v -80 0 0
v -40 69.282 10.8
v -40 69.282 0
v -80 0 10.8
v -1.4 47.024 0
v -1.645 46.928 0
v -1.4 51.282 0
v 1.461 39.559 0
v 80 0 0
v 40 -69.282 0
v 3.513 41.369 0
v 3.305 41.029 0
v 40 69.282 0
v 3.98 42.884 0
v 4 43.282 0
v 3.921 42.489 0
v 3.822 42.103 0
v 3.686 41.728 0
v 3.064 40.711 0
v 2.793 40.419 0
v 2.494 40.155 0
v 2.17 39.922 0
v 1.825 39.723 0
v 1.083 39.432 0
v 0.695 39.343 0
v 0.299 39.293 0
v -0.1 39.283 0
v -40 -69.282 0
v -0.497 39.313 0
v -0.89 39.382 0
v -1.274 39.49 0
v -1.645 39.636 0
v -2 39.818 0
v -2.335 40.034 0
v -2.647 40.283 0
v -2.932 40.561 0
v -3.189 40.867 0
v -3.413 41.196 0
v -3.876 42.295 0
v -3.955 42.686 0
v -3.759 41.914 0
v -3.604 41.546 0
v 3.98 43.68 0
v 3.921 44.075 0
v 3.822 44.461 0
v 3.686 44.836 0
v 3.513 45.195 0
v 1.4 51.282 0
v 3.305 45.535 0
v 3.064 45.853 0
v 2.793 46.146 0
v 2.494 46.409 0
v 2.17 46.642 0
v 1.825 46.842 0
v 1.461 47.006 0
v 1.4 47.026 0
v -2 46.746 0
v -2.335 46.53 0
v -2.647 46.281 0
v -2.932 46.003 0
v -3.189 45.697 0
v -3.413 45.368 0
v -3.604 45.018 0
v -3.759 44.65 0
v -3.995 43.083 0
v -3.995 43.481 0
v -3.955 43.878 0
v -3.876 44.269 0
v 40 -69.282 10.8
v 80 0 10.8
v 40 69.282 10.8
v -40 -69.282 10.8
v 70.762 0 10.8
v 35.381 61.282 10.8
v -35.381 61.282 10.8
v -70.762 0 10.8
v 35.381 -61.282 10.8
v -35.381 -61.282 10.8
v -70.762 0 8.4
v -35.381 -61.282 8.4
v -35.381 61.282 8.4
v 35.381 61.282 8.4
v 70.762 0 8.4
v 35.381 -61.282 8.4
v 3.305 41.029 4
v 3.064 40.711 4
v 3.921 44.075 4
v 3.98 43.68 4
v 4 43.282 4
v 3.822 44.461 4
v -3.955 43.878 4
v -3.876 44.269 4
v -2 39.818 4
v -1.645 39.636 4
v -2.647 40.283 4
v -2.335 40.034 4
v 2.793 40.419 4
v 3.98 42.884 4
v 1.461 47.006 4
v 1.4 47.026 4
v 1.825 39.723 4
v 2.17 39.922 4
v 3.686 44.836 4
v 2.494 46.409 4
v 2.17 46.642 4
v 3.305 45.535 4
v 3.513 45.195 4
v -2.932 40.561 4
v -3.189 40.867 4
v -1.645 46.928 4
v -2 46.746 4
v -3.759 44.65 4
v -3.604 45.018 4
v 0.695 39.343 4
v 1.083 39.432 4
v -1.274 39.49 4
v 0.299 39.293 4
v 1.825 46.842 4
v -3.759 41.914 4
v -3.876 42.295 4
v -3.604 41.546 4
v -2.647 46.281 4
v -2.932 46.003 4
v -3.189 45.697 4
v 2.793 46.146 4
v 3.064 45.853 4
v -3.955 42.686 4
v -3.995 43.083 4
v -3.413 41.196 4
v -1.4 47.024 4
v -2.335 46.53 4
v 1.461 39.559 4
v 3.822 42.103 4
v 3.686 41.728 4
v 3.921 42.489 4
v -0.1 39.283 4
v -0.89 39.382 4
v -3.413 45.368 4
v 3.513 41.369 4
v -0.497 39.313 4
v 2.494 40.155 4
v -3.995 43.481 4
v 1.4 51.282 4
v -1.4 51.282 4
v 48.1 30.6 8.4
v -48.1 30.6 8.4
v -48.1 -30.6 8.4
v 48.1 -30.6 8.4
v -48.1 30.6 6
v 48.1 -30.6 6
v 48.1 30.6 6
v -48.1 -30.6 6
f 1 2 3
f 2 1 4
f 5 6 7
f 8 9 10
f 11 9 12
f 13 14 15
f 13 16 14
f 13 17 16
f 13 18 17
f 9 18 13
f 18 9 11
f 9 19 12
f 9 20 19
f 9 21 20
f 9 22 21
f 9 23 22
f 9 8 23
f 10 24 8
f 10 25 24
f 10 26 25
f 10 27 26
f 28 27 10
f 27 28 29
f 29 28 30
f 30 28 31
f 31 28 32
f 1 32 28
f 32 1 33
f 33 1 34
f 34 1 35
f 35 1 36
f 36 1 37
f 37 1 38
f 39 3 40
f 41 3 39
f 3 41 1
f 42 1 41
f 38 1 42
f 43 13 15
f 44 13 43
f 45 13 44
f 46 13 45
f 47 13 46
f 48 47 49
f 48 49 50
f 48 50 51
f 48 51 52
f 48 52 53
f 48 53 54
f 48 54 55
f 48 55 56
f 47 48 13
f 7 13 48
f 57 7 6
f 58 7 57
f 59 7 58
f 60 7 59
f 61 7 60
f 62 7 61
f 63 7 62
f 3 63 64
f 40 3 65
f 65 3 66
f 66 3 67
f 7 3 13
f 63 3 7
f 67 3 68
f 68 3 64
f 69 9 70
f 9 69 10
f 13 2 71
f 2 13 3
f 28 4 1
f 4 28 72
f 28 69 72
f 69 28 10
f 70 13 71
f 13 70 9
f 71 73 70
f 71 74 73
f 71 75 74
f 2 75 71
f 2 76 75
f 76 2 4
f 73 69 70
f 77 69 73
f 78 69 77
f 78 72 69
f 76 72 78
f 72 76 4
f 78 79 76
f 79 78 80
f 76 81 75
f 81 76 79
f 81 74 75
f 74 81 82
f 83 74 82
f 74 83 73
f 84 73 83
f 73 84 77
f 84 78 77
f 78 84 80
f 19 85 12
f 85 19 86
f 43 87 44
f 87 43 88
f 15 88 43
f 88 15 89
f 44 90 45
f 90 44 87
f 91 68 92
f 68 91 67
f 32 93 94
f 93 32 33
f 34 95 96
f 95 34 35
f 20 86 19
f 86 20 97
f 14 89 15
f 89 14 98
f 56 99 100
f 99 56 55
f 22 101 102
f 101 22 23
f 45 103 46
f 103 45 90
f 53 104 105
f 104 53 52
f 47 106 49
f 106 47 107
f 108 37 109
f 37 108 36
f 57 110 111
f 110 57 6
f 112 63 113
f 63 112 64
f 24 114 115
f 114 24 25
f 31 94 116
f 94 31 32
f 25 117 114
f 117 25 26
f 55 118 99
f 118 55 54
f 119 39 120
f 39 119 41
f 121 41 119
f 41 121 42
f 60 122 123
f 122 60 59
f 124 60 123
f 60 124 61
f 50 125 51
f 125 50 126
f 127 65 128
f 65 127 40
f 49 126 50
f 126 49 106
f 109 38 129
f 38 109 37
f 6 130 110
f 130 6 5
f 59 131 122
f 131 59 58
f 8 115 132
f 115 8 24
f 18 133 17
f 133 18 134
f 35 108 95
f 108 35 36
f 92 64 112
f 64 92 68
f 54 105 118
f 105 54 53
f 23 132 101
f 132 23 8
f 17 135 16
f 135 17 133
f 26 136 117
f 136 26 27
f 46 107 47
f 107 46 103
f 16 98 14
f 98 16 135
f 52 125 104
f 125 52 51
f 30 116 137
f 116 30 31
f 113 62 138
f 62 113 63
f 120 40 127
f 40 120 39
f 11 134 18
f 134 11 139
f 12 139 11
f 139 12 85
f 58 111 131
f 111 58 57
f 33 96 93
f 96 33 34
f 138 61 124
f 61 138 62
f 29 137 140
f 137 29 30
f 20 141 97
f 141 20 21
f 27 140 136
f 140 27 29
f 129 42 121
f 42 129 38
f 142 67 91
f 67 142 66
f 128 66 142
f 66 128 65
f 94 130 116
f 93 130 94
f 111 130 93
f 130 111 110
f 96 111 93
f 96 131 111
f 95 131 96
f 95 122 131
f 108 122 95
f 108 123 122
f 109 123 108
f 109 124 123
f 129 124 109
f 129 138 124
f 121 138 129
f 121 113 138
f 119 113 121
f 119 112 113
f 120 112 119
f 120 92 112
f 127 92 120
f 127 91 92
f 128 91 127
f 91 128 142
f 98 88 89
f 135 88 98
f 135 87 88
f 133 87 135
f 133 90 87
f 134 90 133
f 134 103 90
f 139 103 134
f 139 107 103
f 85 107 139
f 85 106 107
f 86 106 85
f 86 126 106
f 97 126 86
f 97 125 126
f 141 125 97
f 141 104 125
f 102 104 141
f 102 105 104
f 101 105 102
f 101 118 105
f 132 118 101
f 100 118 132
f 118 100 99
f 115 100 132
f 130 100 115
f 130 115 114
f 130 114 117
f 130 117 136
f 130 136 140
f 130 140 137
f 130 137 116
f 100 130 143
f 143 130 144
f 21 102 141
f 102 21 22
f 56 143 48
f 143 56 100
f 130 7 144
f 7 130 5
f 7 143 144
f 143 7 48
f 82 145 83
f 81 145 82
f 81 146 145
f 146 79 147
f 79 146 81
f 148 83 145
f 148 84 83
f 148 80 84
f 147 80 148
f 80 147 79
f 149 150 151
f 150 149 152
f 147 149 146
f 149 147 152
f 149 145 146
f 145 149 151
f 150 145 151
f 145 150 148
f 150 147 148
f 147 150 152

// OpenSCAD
// =============================================================================
// Finisher Patch Frame
// =============================================================================


// ========================== USER SETTINGS ==============================
/* [Output] */
//  Export the full frame, shell only, or loose front inlay to reduce filament changes
part = "frame"; // [frame,frame_shell,front_inlay]

/* [Patch Text] */
// Top text embossed above the patch opening (e.g. race date)
top_text = "";
// Bottom text embossed below the patch opening (e.g. finish time)
bottom_text = "";      

/* [Text Style] */
// Verify the exact font name in OpenSCAD Help -> Font List on the target system.
// Font used for both text lines
text_font  = "Oswald:style=Bold"; // ["Oswald:style=Bold","Barlow Semi Condensed:style=Bold","Barlow Condensed:style=Bold"]
// mm, letter height for the date line
date_size  = 8;                   
// mm, letter height for the finish-time line
time_size  = 11;
// mm, emboss height above the front inlay surface
text_raise = 1.0;

/* [Mounting Options] */
// Add a hidden keyhole hanger on the back for wall mounting
hanger_enabled     = true;
// Add hidden dovetail slots so frames can link side-to-side
connectors_enabled = false;

// ============================= HEXAGON — FLAT-TOP REGULAR ===================
// All dimensions derive from hex_side so the tile stays exactly regular.
/* [Overall Size] */
// mm, length of one outer hexagon side
hex_side     = 80;

// ================== PATCH (Size of HYROX 25/26 patches) =====================
/* [Patch Shape] */
// Opening shape in the recessed front inlay
patch_shape = "rectangle"; // [rectangle,circle]

/* [Patch Pocket] */
// The default patch is a tall rectangle (bounding box ~60 x 95 mm). We mount
// it in landscape orientation, so "patch width" is the long horizontal edge.
// mm, patch width in the frame's landscape orientation
patch_w     = 95;
// mm, patch height in the frame's landscape orientation
patch_h     = 60;
// mm, physical diameter of a round patch when patch_shape is "circle"
patch_diameter = 90;
// mm, extra fit clearance around the patch on each side
patch_tol   = 0.6;
// mm, pocket depth for the patch body
patch_depth = 2.4;

/* [Appearance] */
// Color for the shell, rim, and outer body
frame_body_color = "white";
 // Color for the recessed front inlay around the patch
frame_face_color = "black";

/* [Hidden] */
hex_width    = hex_side * 2;       // point-to-point
hex_height   = hex_side * sqrt(3); // flat-to-flat
hex_shoulder = hex_side / 2;       // point inset from the flats


// ========================== LAYER STACK ================================
// z = 0 is the wall side. Total frame thickness = body_thick + well_depth.
body_thick            = 5.0;                     // mm, solid back/body thickness
face_thick            = patch_depth + 1.0;       // Thickness of the separate front inlay layer
rim_lift              = 2.4;                     // mm, how far the outer frame stands above the face
well_depth            = face_thick + rim_lift;   // Total recess depth above the body
frame_total_thick     = body_thick + well_depth; // mm, overall frame thickness at the outer perimeter
rim_width             = 8;                       // mm, visible frame rim width from the outer edge inward
front_inlay_clearance = 0.15;                    // mm, glue-up clearance per side for the loose front inlay


// ============================= DOVETAIL CONNECTORS ===========================
conn_mouth_w         = 9;    // mm, narrow visible opening of each dovetail slot
conn_lock_w          = 13;   // mm, wider locking width deeper inside the frame
conn_depth           = 9;    // mm, inward reach of the dovetail slot
conn_tol             = 0.25; // mm, extra side clearance for connector fit
slot_mouth_overshoot = 0.3;  // mm, slight extension past the edge for a clean opening


// ============================= HANGER ========================================
hanger_d          = 8.0;  // mm, round clearance for the nail or screw head
hanger_shaft_d    = 2.8;  // mm, narrow slot width for the nail or screw shaft
hanger_drop       = 8;    // mm, downward travel from the round hole into the slot
hanger_y_off      = 26;   // mm, hole center offset down from the top flat
hanger_front_wall = 1.0;  // mm, material left between the hanger slot and the front face


// ============================= BOOLEAN TWEAKS ================================
bool_eps = 0.01; // mm, tiny overlap used to keep boolean cuts robust
conn_slot_h = body_thick - 0.8 + bool_eps; // mm, connector slot depth with a fixed front cover


// ============================= RENDER QUALITY ================================
$fa = 2;
$fs = 0.4;


// =============================================================================
// SANITY CHECKS
// =============================================================================

function is_valid_part(p) =
  p == "frame" ||
  p == "frame_shell" ||
  p == "front_inlay";

function is_valid_patch_shape(shape) =
  shape == "rectangle" ||
  shape == "circle";

function face_inner_side(clearance = 0) =
  hex_side - 2 * (rim_width + clearance) / sqrt(3);
function face_inner_height(clearance = 0) =
  hex_height - 2 * (rim_width + clearance);
function face_inner_half_width_at_y(y, clearance = 0) =
  let(side = face_inner_side(clearance))
  side - abs(y) / sqrt(3);

module _sanity() {
  pocket_w = pocket_width();
  pocket_h = pocket_height();
  pocket_d = pocket_diameter();
  pocket_half_y = pocket_h / 2;
  min_face_half_w = face_inner_half_width_at_y(pocket_half_y, front_inlay_clearance);
  min_face_h = face_inner_height(front_inlay_clearance);
  hanger_top_margin = hanger_y_off - hanger_d / 2;
  hanger_top_slot_y = hex_height / 2 - hanger_y_off + hanger_drop;

  assert(is_valid_part(part),
      str("Unknown part '", part,
          "'. Use frame, frame_shell, or front_inlay."));
  assert(is_valid_patch_shape(patch_shape),
      str("Unknown patch_shape '", patch_shape,
          "'. Use rectangle or circle."));
  assert(front_inlay_clearance >= 0,
      "front_inlay_clearance must be non-negative");
  assert(face_inner_side(front_inlay_clearance) > 0,
      "rim_width + front_inlay_clearance leaves no usable front inlay");
  if (patch_shape == "circle") {
    assert(patch_diameter > 0,
        "patch_diameter must stay positive");
    assert(pocket_d < min_face_h,
        "circular patch pocket exceeds the recessed face insert; reduce patch diameter/tolerance or increase the usable face area");
  } else {
    assert(pocket_h < min_face_h,
        "patch pocket height exceeds the recessed face insert height");
    assert(pocket_w / 2 < min_face_half_w,
        "patch pocket reaches the sloped face edges; reduce patch size/tolerance or increase the usable face area");
  }
  assert(conn_mouth_w + 2 * conn_tol < conn_lock_w,
      "dovetail mouth width too close to lock width — will not hold");
  assert(conn_depth > rim_width,
      "conn_depth must exceed rim_width so the slot reaches under the recessed face layer");
  assert(conn_mouth_w + 2 * conn_tol < hex_side,
      "dovetail mouth width exceeds the available edge length");
  assert(conn_lock_w + 2 * conn_tol < hex_side,
      "dovetail lock width too large for the hex side length");
  assert(hanger_front_wall >= 0 && hanger_front_wall < body_thick,
      "hanger_front_wall must stay non-negative and below body_thick");
  assert(hanger_top_margin > 0,
      "hanger hole breaches the top flat; increase hanger_y_off or reduce hanger_d");
  assert(hanger_top_slot_y < hex_height / 2,
      "hanger slot breaches the top flat; reduce hanger_drop or increase hanger_y_off");
  assert(face_thick > patch_depth,
      "face_thick must exceed patch_depth so the pocket stays inside the recessed face layer");
  assert(rim_lift > 0,
      "rim_lift must stay visibly positive so the outer frame stands proud of the face");
}
_sanity();


// =============================================================================
// 2D PRIMITIVES
// =============================================================================

// Corner order matches hex_shape(): CCW, flat-top, starting at the right point.
function hex_corners() = [
  [ hex_width / 2,  0             ],
  [ hex_shoulder,   hex_height / 2],
  [-hex_shoulder,   hex_height / 2],
  [-hex_width / 2,  0             ],
  [-hex_shoulder,  -hex_height / 2],
  [ hex_shoulder,  -hex_height / 2]
];

// Regular flat-top hexagon centred on the origin, with CCW winding.
module hex_shape() {
  polygon(hex_corners());
}

// Inset the hex by a perpendicular distance d.
module hex_inset(d) {
  offset(r = -d) hex_shape();
}

// Mouth sits on y = 0 and widens toward +y up to depth L.
module dovetail_profile(mouth, lock, depth) {
  polygon([
    [-mouth / 2, 0],
    [ mouth / 2, 0],
    [ lock / 2,  depth],
    [-lock / 2,  depth]
  ]);
}

// =============================================================================
// EDGE HELPERS
// =============================================================================

function edge_mid(p1, p2) = [
  (p1[0] + p2[0]) / 2,
  (p1[1] + p2[1]) / 2
];

// For a CCW polygon, the outward normal of edge p1→p2 is (dy, -dx).
function edge_outward_angle(p1, p2) =
  let(dx = p2[0] - p1[0], dy = p2[1] - p1[1])
  atan2(-dx, dy);

module on_edge(edge_i, offset = [0, 0, 0]) {
  corners = hex_corners();
  p1 = corners[edge_i];
  p2 = corners[(edge_i + 1) % 6];
  mid = edge_mid(p1, p2);
  ang = edge_outward_angle(p1, p2);

  translate(offset)
    translate([mid[0], mid[1], 0])
      rotate([0, 0, ang + 90])
        children();
}

// Slot shape cut into the frame body after the caller orients it to an edge.
module connector_slot_cutout() {
  translate([0, 0, -bool_eps])
    linear_extrude(height = conn_slot_h)
      translate([0, -slot_mouth_overshoot, 0])
        dovetail_profile(
          conn_mouth_w + 2 * conn_tol,
          conn_lock_w + 2 * conn_tol,
          conn_depth + slot_mouth_overshoot
        );
}

function connector_slot_mouth_w() = conn_mouth_w + 2 * conn_tol;
function connector_slot_lock_w() = conn_lock_w + 2 * conn_tol;
function connector_slot_depth() = conn_depth + slot_mouth_overshoot;
function connector_key_height() = conn_slot_h - bool_eps;
function connector_key_mouth_w(side_clearance = 0.04) =
  connector_slot_mouth_w() - 2 * side_clearance;
function connector_key_lock_w(side_clearance = 0.04) =
  connector_slot_lock_w() - 2 * side_clearance;
function connector_key_depth(end_clearance = 0.08) =
  connector_slot_depth() - end_clearance;

module connector_key_profile(side_clearance = 0.04, end_clearance = 0.08) {
  depth = connector_key_depth(end_clearance);

  assert(side_clearance >= 0,
      "connector side_clearance must be non-negative");
  assert(end_clearance >= 0,
      "connector end_clearance must be non-negative");
  assert(connector_key_mouth_w(side_clearance) > 0,
      "connector mouth width collapses; reduce side_clearance");
  assert(connector_key_lock_w(side_clearance) > connector_key_mouth_w(side_clearance),
      "connector lock width must stay wider than the mouth");
  assert(depth > 0,
      "connector depth collapses; reduce end_clearance");

  union() {
    dovetail_profile(
      connector_key_mouth_w(side_clearance),
      connector_key_lock_w(side_clearance),
      depth
    );

    mirror([0, 1, 0])
      dovetail_profile(
        connector_key_mouth_w(side_clearance),
        connector_key_lock_w(side_clearance),
        depth
      );
  }
}

module connector_key(
    side_clearance = 0.04,
    end_clearance = 0.08,
    lead_in = 0.25,
    key_color = frame_body_color) {
  key_h = connector_key_height();
  lead_h = min(lead_in, key_h);
  straight_h = key_h - lead_h;

  assert(key_h > 0,
      "connector key height must stay positive");
  assert(lead_in >= 0,
      "connector lead_in must be non-negative");
  assert(lead_h < connector_key_mouth_w(side_clearance) / 2,
      "connector lead_in is too large for the mouth width");
  assert(lead_h < connector_key_depth(end_clearance),
      "connector lead_in is too large for the key depth");

  color(key_color)
    union() {
      if (lead_h > 0)
        hull() {
          linear_extrude(height = bool_eps)
            offset(delta = -lead_h)
              connector_key_profile(side_clearance, end_clearance);

          translate([0, 0, lead_h - bool_eps])
            linear_extrude(height = bool_eps)
              connector_key_profile(side_clearance, end_clearance);
        }

      if (straight_h > 0)
        translate([0, 0, lead_h])
          linear_extrude(height = straight_h)
            connector_key_profile(side_clearance, end_clearance);
    }
}

// =============================================================================
// FRAME
// =============================================================================

function pocket_width() = patch_w + 2 * patch_tol;
function pocket_height() = patch_h + 2 * patch_tol;
function pocket_diameter() = patch_diameter + 2 * patch_tol;
function face_inner_top_y(clearance = 0) =
  hex_height / 2 - rim_width - clearance;
function text_band_y(clearance = 0) =
  (face_inner_top_y(clearance) +
   (patch_shape == "circle" ? pocket_diameter() : pocket_height()) / 2) / 2;

module frame_shell() {
  // Body shell for split builds and the integrated frame alike.
  color(frame_body_color)
    difference() {
      union() {
        linear_extrude(height = body_thick)
          hex_shape();

        translate([0, 0, body_thick])
          linear_extrude(height = well_depth)
            difference() {
              hex_shape();
              hex_inset(rim_width);
            }
      }

      if (connectors_enabled)
        for (i = [0:5])
          on_edge(i)
            connector_slot_cutout();

      if (hanger_enabled) {
        hole_h = body_thick - hanger_front_wall;
        keyhole_y = hex_height / 2 - hanger_y_off;

        translate([0, keyhole_y, -bool_eps]) {
          cylinder(h = hole_h + bool_eps, d = hanger_d);
          translate([-hanger_shaft_d / 2, 0, 0])
            cube([hanger_shaft_d, hanger_drop, hole_h + bool_eps]);
        }
      }
    }
}

module front_inlay_shape(clearance = 0) {
  hex_inset(rim_width + clearance);
}

module front_inlay(z0 = 0, clearance = 0) {
  pocket_w = pocket_width();
  pocket_h = pocket_height();
  top_text_y = text_band_y(clearance);
  bottom_text_y = -top_text_y;

  color(frame_face_color)
    translate([0, 0, z0])
      difference() {
        linear_extrude(height = face_thick)
          front_inlay_shape(clearance);

        if (patch_shape == "circle")
          translate([0, 0, face_thick - patch_depth])
            cylinder(h = patch_depth + bool_eps, d = pocket_diameter());
        else
          translate([0, 0, face_thick - patch_depth])
            linear_extrude(height = patch_depth + bool_eps)
              square([pocket_w, pocket_h], center = true);
      }

  color(frame_body_color) {
    translate([0, top_text_y, z0 + face_thick])
      linear_extrude(height = text_raise)
        text(top_text, size = date_size, font = text_font,
             halign = "center", valign = "center");

    translate([0, bottom_text_y, z0 + face_thick])
      linear_extrude(height = text_raise)
        text(bottom_text, size = time_size, font = text_font,
             halign = "center", valign = "center");
  }
}

module frame() {
  frame_shell();
  front_inlay(z0 = body_thick);
}


// =============================================================================
// RENDER DISPATCH
// =============================================================================

if (part == "frame")
  frame();
else if (part == "frame_shell")
  frame_shell();
else if (part == "front_inlay")
  front_inlay(clearance = front_inlay_clearance);
